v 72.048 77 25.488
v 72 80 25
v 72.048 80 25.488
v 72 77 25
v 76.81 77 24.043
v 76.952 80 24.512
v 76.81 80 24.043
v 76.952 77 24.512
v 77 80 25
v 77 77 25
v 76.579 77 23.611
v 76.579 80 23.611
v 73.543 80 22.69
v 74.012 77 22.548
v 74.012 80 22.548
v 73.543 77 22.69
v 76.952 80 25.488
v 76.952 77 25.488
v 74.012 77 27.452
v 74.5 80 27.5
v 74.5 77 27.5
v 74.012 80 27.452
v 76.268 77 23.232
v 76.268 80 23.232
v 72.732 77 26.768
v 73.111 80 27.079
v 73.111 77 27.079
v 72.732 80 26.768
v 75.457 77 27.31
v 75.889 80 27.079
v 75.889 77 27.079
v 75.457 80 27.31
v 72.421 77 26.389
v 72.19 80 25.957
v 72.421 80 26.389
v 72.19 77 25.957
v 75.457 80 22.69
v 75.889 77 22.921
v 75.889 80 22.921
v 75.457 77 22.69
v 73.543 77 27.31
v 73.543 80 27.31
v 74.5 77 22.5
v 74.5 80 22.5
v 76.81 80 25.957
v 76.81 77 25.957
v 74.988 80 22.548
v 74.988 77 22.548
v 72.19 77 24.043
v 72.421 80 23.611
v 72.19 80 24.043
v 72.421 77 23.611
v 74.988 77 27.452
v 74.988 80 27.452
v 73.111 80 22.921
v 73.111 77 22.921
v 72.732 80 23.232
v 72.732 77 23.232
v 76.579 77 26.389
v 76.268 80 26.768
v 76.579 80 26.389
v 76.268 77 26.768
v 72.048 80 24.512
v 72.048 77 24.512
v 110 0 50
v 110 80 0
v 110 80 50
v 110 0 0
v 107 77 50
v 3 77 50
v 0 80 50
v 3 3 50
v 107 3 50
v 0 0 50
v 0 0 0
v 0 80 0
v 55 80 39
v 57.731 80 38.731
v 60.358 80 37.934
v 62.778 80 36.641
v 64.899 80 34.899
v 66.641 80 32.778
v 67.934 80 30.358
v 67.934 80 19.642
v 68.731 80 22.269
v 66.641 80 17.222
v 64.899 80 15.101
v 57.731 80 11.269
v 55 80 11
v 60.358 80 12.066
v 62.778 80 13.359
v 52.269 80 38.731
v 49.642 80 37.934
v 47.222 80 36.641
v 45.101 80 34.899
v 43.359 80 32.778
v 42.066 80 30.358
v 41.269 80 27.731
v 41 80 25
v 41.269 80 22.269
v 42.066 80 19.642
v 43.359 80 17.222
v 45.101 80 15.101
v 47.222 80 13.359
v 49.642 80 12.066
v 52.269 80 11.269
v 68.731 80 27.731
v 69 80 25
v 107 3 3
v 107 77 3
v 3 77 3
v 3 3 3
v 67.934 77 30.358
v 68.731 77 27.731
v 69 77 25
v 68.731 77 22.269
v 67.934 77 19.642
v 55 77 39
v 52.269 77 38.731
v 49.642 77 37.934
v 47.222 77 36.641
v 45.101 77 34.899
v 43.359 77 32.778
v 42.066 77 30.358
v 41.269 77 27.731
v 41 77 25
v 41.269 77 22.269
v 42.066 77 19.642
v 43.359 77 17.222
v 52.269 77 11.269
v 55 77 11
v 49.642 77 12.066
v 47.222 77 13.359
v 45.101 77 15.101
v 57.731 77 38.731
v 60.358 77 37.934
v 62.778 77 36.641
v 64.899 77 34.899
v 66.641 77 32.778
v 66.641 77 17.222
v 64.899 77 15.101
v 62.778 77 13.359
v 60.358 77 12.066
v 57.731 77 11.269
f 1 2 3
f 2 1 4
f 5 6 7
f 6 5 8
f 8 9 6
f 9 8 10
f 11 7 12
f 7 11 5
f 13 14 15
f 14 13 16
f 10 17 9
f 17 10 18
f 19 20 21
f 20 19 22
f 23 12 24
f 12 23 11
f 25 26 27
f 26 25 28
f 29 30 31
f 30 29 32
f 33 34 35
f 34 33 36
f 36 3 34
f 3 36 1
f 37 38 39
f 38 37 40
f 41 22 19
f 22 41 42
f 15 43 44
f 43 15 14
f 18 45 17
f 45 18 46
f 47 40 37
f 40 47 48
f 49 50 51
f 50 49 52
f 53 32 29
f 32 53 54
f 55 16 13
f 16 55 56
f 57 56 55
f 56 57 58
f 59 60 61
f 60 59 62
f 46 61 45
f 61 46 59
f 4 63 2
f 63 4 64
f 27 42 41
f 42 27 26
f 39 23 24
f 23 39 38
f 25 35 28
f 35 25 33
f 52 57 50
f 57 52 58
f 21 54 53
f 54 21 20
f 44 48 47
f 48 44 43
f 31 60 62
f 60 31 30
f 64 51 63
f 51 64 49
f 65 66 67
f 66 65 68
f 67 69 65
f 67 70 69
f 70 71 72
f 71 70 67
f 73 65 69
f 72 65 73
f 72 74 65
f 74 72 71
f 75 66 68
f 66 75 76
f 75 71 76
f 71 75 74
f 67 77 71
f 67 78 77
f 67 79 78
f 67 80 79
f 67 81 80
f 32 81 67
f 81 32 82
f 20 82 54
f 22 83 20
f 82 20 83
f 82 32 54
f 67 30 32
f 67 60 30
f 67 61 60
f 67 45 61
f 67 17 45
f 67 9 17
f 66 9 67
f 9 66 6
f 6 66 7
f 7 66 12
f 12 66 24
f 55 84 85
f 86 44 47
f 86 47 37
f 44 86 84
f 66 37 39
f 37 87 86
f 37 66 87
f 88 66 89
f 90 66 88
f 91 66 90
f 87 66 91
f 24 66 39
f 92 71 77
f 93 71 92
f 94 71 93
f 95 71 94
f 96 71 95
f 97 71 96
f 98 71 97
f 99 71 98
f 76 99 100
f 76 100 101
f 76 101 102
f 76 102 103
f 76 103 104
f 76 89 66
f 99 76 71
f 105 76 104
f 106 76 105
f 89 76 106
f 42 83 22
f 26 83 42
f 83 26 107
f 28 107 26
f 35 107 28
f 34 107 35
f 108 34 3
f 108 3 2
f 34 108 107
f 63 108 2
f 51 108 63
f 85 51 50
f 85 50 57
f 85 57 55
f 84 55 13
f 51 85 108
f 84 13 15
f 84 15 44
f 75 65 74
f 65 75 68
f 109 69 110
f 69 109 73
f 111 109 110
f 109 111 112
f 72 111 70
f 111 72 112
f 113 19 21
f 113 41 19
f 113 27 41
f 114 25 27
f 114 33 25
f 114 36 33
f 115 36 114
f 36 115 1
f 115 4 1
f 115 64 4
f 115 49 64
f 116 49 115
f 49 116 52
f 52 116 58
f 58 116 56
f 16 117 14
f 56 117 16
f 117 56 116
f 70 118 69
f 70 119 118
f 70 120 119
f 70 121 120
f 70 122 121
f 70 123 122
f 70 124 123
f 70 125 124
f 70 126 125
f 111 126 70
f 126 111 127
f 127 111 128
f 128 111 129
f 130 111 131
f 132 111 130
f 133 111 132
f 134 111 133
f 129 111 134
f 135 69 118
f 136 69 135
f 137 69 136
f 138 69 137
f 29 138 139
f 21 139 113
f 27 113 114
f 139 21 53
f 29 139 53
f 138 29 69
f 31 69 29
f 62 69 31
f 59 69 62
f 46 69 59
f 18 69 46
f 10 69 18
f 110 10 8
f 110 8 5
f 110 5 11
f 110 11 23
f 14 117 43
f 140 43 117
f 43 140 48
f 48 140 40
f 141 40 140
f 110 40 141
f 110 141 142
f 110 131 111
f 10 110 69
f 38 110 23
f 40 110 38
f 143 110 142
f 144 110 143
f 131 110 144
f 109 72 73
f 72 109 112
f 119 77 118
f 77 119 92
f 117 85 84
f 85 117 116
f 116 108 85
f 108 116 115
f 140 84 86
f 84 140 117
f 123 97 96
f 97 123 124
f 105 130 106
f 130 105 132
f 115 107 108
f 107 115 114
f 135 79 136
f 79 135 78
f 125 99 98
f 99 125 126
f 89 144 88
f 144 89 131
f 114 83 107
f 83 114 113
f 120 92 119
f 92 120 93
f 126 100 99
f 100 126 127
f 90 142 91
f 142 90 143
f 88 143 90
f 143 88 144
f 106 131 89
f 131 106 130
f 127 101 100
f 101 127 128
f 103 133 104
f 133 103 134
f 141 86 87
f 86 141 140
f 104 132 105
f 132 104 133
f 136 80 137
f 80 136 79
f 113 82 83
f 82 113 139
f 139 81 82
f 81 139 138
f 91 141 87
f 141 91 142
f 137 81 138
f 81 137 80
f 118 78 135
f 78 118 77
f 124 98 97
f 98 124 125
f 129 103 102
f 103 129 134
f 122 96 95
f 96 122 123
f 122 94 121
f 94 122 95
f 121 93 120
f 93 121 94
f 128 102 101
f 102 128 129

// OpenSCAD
$fn = 32;

// ----------------------------------------------------------------------
// Vent box: roundvent enclosure
// ----------------------------------------------------------------------

// --- parameters (mm) ---
box_l = 110;              // box length, X
box_w = 80;               // box width, Y
box_h = 50;               // box height, Z
wall_t = 3;               // shell wall thickness
vent_d = 28;              // central vent diameter
ring_d = 5;               // ring hole diameter
n_ring = 6;               // holes in the ring
ring_r = 19.5;            // ring radius

ring_step = 360 / n_ring;  // ring hole angular step

difference() {
  cube([box_l, box_w, box_h]);
  translate([wall_t, wall_t, wall_t])
    cube([box_l - 2 * wall_t, box_w - 2 * wall_t, box_h]);
  translate([box_l / 2, box_w - wall_t - 1, box_h / 2])
    rotate([-90, 0, 0]) cylinder(h = wall_t + 2, d = vent_d);
  for (i = [0 : n_ring - 1])
    translate([box_l / 2, box_w - wall_t - 1, box_h / 2])
      rotate([0, 0, i * ring_step])
        translate([ring_r, 0, 0]) rotate([-90, 0, 0])
          cylinder(h = wall_t + 2, d = ring_d);
}
